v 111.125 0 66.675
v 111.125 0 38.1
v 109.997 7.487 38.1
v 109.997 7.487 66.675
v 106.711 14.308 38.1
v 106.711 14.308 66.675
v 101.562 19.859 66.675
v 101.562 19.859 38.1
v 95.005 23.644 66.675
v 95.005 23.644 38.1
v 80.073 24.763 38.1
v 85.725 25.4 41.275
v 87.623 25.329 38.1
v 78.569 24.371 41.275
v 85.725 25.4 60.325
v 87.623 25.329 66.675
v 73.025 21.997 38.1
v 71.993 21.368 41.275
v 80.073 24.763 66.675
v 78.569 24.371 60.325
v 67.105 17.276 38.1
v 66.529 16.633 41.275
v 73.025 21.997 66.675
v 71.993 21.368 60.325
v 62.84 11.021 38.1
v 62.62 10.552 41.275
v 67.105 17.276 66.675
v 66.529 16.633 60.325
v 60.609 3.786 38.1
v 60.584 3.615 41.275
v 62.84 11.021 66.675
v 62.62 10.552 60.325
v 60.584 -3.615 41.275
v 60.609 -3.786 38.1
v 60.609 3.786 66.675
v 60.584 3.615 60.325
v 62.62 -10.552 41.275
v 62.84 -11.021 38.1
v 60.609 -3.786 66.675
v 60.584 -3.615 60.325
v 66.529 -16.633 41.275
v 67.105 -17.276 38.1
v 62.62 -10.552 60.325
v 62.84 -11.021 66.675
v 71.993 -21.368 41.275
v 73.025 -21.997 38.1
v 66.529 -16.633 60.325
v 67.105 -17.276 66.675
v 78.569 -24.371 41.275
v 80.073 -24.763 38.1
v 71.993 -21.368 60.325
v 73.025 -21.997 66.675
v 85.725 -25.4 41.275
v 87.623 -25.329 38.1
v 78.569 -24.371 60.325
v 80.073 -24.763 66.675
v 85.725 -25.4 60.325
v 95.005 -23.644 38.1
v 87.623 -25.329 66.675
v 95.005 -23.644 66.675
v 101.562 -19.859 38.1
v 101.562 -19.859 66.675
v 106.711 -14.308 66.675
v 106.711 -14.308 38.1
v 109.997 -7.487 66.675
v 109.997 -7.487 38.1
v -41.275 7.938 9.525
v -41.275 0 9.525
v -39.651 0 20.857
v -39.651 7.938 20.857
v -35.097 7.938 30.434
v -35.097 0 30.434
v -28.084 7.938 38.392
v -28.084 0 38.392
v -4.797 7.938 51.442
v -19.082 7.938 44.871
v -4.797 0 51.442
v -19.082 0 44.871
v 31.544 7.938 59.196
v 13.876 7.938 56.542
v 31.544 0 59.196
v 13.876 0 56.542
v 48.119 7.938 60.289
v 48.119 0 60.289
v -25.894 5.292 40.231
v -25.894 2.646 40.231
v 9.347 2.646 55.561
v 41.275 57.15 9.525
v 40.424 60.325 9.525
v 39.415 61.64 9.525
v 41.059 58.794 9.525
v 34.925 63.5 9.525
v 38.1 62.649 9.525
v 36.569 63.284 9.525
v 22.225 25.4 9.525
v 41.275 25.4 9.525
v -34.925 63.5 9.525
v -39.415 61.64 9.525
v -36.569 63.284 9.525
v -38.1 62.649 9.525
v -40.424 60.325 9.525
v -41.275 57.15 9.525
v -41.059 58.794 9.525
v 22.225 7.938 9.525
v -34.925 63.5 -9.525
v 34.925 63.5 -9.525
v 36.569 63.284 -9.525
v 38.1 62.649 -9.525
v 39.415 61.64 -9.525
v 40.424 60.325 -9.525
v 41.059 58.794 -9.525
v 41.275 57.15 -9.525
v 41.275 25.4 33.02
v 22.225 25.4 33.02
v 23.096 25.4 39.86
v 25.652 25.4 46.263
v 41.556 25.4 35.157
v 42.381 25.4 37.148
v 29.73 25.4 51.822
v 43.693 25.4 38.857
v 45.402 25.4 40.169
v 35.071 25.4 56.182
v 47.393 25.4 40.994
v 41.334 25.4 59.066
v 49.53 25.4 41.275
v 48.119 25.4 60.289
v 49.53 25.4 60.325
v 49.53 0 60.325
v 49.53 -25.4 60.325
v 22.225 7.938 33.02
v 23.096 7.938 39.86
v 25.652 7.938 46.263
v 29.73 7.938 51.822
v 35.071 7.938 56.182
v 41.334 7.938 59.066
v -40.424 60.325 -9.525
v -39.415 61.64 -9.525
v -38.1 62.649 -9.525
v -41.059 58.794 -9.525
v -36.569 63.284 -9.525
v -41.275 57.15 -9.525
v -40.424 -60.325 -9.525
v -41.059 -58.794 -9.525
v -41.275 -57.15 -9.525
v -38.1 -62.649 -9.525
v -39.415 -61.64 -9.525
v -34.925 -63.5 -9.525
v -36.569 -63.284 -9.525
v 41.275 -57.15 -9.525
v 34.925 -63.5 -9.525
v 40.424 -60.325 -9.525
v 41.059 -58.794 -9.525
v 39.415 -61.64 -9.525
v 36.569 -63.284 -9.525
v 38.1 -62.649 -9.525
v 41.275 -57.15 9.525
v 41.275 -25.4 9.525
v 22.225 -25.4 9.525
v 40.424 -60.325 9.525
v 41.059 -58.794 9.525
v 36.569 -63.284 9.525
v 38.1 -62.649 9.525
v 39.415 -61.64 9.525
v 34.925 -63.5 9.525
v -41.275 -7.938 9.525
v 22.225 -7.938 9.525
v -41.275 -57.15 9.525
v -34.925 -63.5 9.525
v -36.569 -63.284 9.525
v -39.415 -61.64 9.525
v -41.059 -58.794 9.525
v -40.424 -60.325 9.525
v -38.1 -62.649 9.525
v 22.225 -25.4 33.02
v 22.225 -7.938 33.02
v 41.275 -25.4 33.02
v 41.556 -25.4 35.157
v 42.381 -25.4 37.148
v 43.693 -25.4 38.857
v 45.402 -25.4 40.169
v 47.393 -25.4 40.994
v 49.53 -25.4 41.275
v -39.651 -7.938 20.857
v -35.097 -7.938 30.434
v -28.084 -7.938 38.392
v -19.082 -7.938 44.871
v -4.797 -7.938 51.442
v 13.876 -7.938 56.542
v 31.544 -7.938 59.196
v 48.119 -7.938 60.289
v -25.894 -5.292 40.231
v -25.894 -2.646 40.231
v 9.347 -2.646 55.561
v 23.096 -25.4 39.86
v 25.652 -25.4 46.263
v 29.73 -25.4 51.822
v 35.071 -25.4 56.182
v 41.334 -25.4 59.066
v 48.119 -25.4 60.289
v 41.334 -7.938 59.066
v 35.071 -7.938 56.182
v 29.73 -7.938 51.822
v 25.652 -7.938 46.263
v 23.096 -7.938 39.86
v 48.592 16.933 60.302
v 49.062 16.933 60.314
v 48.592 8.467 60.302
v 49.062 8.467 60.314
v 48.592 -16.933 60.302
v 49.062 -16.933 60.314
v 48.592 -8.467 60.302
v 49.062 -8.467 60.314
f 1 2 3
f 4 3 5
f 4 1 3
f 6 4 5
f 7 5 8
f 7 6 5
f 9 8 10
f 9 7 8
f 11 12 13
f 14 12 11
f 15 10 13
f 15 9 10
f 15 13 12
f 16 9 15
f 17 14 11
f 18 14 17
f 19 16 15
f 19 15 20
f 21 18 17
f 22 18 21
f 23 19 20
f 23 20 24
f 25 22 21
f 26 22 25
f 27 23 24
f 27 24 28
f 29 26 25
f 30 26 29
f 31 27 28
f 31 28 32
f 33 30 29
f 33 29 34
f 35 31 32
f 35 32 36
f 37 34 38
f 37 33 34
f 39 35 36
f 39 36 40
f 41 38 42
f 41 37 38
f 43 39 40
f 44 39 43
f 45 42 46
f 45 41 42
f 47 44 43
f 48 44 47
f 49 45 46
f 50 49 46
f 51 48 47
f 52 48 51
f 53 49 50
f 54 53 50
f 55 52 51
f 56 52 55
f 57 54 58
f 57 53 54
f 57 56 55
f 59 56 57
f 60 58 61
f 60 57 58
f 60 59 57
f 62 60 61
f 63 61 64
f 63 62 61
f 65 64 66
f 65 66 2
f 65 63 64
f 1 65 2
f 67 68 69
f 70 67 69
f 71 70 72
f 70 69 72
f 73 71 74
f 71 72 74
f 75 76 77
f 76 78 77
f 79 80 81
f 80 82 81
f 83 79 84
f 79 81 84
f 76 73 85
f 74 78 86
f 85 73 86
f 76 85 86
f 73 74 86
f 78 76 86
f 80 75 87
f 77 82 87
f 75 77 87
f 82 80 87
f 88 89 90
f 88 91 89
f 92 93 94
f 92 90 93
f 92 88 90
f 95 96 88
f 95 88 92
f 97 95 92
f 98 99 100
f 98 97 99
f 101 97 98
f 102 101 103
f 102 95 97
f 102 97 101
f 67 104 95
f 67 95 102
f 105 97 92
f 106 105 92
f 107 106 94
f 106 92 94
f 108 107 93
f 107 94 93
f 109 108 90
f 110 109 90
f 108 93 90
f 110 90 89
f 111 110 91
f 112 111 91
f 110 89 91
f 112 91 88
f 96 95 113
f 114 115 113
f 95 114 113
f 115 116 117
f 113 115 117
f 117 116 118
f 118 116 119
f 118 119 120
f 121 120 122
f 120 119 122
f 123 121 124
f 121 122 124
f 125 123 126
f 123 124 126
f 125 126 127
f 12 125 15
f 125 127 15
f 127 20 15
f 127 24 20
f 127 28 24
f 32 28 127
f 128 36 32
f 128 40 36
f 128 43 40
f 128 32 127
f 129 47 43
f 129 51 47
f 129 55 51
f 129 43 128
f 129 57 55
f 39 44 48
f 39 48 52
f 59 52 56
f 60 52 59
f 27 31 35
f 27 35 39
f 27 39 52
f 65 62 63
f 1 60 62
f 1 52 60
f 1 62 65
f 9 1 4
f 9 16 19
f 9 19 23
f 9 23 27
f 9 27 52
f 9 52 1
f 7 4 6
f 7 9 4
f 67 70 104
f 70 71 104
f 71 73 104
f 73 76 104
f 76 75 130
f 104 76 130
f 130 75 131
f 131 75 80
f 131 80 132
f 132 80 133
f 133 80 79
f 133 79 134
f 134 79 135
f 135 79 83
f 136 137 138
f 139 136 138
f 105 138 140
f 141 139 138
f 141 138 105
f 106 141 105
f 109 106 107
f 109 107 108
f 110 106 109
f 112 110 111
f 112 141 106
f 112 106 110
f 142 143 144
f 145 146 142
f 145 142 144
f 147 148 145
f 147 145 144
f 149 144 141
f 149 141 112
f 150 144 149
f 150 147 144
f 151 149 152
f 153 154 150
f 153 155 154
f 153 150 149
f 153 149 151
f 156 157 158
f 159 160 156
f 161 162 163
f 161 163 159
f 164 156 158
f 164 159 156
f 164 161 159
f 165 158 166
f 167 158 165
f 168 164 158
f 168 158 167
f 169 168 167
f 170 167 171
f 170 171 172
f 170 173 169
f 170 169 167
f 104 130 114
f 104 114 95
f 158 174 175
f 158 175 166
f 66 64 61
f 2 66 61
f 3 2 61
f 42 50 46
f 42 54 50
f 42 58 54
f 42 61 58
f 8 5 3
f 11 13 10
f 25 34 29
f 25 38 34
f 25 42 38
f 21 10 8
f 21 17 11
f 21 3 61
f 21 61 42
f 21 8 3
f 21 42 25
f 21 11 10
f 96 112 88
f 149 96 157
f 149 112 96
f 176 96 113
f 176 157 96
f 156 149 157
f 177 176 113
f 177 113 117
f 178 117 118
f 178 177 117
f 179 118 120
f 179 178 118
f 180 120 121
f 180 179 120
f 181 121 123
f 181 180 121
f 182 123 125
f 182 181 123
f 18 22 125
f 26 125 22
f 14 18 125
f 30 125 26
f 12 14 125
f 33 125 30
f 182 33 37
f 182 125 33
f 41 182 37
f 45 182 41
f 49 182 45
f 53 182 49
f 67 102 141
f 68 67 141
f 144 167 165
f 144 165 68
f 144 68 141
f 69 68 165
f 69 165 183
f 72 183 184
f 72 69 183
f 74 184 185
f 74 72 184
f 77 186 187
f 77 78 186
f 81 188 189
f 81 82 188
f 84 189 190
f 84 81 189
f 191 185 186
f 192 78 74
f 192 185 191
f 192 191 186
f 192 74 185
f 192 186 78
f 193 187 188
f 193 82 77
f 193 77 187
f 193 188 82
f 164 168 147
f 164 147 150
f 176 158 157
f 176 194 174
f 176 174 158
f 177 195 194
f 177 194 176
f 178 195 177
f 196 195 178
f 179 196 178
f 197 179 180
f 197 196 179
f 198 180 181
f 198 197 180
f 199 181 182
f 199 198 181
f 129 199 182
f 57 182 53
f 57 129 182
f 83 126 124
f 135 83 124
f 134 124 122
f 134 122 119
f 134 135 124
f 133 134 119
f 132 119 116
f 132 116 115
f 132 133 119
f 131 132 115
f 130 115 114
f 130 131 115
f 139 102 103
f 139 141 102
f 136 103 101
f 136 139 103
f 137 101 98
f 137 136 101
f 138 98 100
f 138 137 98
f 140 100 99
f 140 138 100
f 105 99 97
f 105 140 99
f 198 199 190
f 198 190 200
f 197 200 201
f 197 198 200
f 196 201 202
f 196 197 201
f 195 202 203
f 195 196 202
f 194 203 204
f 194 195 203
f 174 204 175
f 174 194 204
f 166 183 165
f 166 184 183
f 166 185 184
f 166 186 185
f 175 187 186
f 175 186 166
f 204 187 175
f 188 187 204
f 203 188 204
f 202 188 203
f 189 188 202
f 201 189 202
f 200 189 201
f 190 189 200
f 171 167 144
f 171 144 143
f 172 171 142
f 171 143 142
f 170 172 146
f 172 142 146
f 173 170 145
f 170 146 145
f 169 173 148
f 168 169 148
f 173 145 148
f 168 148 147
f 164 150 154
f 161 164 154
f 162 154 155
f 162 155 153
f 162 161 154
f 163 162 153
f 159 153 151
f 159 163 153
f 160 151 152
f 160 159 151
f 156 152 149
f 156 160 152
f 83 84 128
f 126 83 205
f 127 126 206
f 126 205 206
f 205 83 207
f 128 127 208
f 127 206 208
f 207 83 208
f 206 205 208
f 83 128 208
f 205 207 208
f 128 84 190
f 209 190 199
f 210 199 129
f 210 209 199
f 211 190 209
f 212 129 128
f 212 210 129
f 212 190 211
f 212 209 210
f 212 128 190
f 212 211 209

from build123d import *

# Parameters (mm, degrees)
F1_DEPTH = 63.5
F0_W     = 25.4
F0_H     = 19.05
F2_DEPTH = 25.4
F3_DEPTH = 7.9375
F4_R     = 6.35


with BuildPart() as f1:
    # F0 (on Front) → F1 (new body, symmetric)
    with BuildSketch(Plane.XZ):
        Polygon((41.275, -9.525), (41.275, 9.525), (22.225, 9.525), (-41.275, 9.525), (-41.275, -9.525), align=None)
    extrude(amount=F1_DEPTH, both=True)

    # F0 (on Front) → F2 (join, symmetric)
    with BuildSketch(Plane.XZ):
        with BuildLine():
            Line((22.225, 9.525), (41.275, 9.525))
            Line((41.275, 9.525), (41.275, 33.02))
            ThreePointArc((41.275, 33.02), (43.6928335213, 38.8571664787), (49.53, 41.275))
            Line((49.53, 41.275), (60.325, 41.275))
            Line((60.325, 41.275), (60.325, 60.325))
            Line((60.325, 60.325), (49.53, 60.325))
            add(Edge.make_bspline(
                [(48.1194647713, 60.2885425971), (48.5932006273, 60.3022707881), (49.063439273, 60.3144056478), (49.53, 60.325)],
                knots=[102.663192175, 102.663192175, 102.663192175, 102.663192175, 104.0489693606, 104.0489693606, 104.0489693606, 104.0489693606], degree=3))
            ThreePointArc((48.1194647713, 60.2885425971), (29.730029174, 51.8222387042), (22.225, 33.02))
            Line((22.225, 33.02), (22.225, 9.525))
        make_face()
        with Locations((73.025, 50.8)):
            Rectangle(F0_W, F0_H)
    extrude(amount=F2_DEPTH, both=True)

    # F0 (on Front) → F3 (join, symmetric)
    with BuildSketch(Plane.XZ):
        with BuildLine():
            Line((-41.275, 9.525), (22.225, 9.525))
            Line((22.225, 9.525), (22.225, 33.02))
            ThreePointArc((22.225, 33.02), (29.730029174, 51.8222387042), (48.1194647713, 60.2885425971))
            add(Edge.make_bspline(
                [(-41.275, 9.525), (-41.2664891716, 49.5096992436), (13.0234654023, 59.2715104706), (48.1194647713, 60.2885425971)],
                knots=[0, 0, 0, 0, 102.663192175, 102.663192175, 102.663192175, 102.663192175], degree=3))
        make_face()
    extrude(amount=F3_DEPTH, both=True)

    # F4
    f4_edges = [f1.edges().sort_by_distance(p)[0] for p in [
        (41.275, -63.5, 0),
        (-41.275, -63.5, 0),
        (41.275, 63.5, 0),
        (-41.275, 63.5, 0),
    ]]
    fillet(f4_edges, radius=F4_R)

    # F0 (on Front) → F5 (revolve)
    with BuildSketch(Plane.XZ):
        Polygon((85.725, 60.325), (85.725, 41.275), (85.725, 38.1), (111.125, 38.1), (111.125, 66.675), (85.725, 66.675), align=None)
    revolve(axis=Axis((85.725, 0, 52.3875), (0, 0, 1)))


solid = f1.part
